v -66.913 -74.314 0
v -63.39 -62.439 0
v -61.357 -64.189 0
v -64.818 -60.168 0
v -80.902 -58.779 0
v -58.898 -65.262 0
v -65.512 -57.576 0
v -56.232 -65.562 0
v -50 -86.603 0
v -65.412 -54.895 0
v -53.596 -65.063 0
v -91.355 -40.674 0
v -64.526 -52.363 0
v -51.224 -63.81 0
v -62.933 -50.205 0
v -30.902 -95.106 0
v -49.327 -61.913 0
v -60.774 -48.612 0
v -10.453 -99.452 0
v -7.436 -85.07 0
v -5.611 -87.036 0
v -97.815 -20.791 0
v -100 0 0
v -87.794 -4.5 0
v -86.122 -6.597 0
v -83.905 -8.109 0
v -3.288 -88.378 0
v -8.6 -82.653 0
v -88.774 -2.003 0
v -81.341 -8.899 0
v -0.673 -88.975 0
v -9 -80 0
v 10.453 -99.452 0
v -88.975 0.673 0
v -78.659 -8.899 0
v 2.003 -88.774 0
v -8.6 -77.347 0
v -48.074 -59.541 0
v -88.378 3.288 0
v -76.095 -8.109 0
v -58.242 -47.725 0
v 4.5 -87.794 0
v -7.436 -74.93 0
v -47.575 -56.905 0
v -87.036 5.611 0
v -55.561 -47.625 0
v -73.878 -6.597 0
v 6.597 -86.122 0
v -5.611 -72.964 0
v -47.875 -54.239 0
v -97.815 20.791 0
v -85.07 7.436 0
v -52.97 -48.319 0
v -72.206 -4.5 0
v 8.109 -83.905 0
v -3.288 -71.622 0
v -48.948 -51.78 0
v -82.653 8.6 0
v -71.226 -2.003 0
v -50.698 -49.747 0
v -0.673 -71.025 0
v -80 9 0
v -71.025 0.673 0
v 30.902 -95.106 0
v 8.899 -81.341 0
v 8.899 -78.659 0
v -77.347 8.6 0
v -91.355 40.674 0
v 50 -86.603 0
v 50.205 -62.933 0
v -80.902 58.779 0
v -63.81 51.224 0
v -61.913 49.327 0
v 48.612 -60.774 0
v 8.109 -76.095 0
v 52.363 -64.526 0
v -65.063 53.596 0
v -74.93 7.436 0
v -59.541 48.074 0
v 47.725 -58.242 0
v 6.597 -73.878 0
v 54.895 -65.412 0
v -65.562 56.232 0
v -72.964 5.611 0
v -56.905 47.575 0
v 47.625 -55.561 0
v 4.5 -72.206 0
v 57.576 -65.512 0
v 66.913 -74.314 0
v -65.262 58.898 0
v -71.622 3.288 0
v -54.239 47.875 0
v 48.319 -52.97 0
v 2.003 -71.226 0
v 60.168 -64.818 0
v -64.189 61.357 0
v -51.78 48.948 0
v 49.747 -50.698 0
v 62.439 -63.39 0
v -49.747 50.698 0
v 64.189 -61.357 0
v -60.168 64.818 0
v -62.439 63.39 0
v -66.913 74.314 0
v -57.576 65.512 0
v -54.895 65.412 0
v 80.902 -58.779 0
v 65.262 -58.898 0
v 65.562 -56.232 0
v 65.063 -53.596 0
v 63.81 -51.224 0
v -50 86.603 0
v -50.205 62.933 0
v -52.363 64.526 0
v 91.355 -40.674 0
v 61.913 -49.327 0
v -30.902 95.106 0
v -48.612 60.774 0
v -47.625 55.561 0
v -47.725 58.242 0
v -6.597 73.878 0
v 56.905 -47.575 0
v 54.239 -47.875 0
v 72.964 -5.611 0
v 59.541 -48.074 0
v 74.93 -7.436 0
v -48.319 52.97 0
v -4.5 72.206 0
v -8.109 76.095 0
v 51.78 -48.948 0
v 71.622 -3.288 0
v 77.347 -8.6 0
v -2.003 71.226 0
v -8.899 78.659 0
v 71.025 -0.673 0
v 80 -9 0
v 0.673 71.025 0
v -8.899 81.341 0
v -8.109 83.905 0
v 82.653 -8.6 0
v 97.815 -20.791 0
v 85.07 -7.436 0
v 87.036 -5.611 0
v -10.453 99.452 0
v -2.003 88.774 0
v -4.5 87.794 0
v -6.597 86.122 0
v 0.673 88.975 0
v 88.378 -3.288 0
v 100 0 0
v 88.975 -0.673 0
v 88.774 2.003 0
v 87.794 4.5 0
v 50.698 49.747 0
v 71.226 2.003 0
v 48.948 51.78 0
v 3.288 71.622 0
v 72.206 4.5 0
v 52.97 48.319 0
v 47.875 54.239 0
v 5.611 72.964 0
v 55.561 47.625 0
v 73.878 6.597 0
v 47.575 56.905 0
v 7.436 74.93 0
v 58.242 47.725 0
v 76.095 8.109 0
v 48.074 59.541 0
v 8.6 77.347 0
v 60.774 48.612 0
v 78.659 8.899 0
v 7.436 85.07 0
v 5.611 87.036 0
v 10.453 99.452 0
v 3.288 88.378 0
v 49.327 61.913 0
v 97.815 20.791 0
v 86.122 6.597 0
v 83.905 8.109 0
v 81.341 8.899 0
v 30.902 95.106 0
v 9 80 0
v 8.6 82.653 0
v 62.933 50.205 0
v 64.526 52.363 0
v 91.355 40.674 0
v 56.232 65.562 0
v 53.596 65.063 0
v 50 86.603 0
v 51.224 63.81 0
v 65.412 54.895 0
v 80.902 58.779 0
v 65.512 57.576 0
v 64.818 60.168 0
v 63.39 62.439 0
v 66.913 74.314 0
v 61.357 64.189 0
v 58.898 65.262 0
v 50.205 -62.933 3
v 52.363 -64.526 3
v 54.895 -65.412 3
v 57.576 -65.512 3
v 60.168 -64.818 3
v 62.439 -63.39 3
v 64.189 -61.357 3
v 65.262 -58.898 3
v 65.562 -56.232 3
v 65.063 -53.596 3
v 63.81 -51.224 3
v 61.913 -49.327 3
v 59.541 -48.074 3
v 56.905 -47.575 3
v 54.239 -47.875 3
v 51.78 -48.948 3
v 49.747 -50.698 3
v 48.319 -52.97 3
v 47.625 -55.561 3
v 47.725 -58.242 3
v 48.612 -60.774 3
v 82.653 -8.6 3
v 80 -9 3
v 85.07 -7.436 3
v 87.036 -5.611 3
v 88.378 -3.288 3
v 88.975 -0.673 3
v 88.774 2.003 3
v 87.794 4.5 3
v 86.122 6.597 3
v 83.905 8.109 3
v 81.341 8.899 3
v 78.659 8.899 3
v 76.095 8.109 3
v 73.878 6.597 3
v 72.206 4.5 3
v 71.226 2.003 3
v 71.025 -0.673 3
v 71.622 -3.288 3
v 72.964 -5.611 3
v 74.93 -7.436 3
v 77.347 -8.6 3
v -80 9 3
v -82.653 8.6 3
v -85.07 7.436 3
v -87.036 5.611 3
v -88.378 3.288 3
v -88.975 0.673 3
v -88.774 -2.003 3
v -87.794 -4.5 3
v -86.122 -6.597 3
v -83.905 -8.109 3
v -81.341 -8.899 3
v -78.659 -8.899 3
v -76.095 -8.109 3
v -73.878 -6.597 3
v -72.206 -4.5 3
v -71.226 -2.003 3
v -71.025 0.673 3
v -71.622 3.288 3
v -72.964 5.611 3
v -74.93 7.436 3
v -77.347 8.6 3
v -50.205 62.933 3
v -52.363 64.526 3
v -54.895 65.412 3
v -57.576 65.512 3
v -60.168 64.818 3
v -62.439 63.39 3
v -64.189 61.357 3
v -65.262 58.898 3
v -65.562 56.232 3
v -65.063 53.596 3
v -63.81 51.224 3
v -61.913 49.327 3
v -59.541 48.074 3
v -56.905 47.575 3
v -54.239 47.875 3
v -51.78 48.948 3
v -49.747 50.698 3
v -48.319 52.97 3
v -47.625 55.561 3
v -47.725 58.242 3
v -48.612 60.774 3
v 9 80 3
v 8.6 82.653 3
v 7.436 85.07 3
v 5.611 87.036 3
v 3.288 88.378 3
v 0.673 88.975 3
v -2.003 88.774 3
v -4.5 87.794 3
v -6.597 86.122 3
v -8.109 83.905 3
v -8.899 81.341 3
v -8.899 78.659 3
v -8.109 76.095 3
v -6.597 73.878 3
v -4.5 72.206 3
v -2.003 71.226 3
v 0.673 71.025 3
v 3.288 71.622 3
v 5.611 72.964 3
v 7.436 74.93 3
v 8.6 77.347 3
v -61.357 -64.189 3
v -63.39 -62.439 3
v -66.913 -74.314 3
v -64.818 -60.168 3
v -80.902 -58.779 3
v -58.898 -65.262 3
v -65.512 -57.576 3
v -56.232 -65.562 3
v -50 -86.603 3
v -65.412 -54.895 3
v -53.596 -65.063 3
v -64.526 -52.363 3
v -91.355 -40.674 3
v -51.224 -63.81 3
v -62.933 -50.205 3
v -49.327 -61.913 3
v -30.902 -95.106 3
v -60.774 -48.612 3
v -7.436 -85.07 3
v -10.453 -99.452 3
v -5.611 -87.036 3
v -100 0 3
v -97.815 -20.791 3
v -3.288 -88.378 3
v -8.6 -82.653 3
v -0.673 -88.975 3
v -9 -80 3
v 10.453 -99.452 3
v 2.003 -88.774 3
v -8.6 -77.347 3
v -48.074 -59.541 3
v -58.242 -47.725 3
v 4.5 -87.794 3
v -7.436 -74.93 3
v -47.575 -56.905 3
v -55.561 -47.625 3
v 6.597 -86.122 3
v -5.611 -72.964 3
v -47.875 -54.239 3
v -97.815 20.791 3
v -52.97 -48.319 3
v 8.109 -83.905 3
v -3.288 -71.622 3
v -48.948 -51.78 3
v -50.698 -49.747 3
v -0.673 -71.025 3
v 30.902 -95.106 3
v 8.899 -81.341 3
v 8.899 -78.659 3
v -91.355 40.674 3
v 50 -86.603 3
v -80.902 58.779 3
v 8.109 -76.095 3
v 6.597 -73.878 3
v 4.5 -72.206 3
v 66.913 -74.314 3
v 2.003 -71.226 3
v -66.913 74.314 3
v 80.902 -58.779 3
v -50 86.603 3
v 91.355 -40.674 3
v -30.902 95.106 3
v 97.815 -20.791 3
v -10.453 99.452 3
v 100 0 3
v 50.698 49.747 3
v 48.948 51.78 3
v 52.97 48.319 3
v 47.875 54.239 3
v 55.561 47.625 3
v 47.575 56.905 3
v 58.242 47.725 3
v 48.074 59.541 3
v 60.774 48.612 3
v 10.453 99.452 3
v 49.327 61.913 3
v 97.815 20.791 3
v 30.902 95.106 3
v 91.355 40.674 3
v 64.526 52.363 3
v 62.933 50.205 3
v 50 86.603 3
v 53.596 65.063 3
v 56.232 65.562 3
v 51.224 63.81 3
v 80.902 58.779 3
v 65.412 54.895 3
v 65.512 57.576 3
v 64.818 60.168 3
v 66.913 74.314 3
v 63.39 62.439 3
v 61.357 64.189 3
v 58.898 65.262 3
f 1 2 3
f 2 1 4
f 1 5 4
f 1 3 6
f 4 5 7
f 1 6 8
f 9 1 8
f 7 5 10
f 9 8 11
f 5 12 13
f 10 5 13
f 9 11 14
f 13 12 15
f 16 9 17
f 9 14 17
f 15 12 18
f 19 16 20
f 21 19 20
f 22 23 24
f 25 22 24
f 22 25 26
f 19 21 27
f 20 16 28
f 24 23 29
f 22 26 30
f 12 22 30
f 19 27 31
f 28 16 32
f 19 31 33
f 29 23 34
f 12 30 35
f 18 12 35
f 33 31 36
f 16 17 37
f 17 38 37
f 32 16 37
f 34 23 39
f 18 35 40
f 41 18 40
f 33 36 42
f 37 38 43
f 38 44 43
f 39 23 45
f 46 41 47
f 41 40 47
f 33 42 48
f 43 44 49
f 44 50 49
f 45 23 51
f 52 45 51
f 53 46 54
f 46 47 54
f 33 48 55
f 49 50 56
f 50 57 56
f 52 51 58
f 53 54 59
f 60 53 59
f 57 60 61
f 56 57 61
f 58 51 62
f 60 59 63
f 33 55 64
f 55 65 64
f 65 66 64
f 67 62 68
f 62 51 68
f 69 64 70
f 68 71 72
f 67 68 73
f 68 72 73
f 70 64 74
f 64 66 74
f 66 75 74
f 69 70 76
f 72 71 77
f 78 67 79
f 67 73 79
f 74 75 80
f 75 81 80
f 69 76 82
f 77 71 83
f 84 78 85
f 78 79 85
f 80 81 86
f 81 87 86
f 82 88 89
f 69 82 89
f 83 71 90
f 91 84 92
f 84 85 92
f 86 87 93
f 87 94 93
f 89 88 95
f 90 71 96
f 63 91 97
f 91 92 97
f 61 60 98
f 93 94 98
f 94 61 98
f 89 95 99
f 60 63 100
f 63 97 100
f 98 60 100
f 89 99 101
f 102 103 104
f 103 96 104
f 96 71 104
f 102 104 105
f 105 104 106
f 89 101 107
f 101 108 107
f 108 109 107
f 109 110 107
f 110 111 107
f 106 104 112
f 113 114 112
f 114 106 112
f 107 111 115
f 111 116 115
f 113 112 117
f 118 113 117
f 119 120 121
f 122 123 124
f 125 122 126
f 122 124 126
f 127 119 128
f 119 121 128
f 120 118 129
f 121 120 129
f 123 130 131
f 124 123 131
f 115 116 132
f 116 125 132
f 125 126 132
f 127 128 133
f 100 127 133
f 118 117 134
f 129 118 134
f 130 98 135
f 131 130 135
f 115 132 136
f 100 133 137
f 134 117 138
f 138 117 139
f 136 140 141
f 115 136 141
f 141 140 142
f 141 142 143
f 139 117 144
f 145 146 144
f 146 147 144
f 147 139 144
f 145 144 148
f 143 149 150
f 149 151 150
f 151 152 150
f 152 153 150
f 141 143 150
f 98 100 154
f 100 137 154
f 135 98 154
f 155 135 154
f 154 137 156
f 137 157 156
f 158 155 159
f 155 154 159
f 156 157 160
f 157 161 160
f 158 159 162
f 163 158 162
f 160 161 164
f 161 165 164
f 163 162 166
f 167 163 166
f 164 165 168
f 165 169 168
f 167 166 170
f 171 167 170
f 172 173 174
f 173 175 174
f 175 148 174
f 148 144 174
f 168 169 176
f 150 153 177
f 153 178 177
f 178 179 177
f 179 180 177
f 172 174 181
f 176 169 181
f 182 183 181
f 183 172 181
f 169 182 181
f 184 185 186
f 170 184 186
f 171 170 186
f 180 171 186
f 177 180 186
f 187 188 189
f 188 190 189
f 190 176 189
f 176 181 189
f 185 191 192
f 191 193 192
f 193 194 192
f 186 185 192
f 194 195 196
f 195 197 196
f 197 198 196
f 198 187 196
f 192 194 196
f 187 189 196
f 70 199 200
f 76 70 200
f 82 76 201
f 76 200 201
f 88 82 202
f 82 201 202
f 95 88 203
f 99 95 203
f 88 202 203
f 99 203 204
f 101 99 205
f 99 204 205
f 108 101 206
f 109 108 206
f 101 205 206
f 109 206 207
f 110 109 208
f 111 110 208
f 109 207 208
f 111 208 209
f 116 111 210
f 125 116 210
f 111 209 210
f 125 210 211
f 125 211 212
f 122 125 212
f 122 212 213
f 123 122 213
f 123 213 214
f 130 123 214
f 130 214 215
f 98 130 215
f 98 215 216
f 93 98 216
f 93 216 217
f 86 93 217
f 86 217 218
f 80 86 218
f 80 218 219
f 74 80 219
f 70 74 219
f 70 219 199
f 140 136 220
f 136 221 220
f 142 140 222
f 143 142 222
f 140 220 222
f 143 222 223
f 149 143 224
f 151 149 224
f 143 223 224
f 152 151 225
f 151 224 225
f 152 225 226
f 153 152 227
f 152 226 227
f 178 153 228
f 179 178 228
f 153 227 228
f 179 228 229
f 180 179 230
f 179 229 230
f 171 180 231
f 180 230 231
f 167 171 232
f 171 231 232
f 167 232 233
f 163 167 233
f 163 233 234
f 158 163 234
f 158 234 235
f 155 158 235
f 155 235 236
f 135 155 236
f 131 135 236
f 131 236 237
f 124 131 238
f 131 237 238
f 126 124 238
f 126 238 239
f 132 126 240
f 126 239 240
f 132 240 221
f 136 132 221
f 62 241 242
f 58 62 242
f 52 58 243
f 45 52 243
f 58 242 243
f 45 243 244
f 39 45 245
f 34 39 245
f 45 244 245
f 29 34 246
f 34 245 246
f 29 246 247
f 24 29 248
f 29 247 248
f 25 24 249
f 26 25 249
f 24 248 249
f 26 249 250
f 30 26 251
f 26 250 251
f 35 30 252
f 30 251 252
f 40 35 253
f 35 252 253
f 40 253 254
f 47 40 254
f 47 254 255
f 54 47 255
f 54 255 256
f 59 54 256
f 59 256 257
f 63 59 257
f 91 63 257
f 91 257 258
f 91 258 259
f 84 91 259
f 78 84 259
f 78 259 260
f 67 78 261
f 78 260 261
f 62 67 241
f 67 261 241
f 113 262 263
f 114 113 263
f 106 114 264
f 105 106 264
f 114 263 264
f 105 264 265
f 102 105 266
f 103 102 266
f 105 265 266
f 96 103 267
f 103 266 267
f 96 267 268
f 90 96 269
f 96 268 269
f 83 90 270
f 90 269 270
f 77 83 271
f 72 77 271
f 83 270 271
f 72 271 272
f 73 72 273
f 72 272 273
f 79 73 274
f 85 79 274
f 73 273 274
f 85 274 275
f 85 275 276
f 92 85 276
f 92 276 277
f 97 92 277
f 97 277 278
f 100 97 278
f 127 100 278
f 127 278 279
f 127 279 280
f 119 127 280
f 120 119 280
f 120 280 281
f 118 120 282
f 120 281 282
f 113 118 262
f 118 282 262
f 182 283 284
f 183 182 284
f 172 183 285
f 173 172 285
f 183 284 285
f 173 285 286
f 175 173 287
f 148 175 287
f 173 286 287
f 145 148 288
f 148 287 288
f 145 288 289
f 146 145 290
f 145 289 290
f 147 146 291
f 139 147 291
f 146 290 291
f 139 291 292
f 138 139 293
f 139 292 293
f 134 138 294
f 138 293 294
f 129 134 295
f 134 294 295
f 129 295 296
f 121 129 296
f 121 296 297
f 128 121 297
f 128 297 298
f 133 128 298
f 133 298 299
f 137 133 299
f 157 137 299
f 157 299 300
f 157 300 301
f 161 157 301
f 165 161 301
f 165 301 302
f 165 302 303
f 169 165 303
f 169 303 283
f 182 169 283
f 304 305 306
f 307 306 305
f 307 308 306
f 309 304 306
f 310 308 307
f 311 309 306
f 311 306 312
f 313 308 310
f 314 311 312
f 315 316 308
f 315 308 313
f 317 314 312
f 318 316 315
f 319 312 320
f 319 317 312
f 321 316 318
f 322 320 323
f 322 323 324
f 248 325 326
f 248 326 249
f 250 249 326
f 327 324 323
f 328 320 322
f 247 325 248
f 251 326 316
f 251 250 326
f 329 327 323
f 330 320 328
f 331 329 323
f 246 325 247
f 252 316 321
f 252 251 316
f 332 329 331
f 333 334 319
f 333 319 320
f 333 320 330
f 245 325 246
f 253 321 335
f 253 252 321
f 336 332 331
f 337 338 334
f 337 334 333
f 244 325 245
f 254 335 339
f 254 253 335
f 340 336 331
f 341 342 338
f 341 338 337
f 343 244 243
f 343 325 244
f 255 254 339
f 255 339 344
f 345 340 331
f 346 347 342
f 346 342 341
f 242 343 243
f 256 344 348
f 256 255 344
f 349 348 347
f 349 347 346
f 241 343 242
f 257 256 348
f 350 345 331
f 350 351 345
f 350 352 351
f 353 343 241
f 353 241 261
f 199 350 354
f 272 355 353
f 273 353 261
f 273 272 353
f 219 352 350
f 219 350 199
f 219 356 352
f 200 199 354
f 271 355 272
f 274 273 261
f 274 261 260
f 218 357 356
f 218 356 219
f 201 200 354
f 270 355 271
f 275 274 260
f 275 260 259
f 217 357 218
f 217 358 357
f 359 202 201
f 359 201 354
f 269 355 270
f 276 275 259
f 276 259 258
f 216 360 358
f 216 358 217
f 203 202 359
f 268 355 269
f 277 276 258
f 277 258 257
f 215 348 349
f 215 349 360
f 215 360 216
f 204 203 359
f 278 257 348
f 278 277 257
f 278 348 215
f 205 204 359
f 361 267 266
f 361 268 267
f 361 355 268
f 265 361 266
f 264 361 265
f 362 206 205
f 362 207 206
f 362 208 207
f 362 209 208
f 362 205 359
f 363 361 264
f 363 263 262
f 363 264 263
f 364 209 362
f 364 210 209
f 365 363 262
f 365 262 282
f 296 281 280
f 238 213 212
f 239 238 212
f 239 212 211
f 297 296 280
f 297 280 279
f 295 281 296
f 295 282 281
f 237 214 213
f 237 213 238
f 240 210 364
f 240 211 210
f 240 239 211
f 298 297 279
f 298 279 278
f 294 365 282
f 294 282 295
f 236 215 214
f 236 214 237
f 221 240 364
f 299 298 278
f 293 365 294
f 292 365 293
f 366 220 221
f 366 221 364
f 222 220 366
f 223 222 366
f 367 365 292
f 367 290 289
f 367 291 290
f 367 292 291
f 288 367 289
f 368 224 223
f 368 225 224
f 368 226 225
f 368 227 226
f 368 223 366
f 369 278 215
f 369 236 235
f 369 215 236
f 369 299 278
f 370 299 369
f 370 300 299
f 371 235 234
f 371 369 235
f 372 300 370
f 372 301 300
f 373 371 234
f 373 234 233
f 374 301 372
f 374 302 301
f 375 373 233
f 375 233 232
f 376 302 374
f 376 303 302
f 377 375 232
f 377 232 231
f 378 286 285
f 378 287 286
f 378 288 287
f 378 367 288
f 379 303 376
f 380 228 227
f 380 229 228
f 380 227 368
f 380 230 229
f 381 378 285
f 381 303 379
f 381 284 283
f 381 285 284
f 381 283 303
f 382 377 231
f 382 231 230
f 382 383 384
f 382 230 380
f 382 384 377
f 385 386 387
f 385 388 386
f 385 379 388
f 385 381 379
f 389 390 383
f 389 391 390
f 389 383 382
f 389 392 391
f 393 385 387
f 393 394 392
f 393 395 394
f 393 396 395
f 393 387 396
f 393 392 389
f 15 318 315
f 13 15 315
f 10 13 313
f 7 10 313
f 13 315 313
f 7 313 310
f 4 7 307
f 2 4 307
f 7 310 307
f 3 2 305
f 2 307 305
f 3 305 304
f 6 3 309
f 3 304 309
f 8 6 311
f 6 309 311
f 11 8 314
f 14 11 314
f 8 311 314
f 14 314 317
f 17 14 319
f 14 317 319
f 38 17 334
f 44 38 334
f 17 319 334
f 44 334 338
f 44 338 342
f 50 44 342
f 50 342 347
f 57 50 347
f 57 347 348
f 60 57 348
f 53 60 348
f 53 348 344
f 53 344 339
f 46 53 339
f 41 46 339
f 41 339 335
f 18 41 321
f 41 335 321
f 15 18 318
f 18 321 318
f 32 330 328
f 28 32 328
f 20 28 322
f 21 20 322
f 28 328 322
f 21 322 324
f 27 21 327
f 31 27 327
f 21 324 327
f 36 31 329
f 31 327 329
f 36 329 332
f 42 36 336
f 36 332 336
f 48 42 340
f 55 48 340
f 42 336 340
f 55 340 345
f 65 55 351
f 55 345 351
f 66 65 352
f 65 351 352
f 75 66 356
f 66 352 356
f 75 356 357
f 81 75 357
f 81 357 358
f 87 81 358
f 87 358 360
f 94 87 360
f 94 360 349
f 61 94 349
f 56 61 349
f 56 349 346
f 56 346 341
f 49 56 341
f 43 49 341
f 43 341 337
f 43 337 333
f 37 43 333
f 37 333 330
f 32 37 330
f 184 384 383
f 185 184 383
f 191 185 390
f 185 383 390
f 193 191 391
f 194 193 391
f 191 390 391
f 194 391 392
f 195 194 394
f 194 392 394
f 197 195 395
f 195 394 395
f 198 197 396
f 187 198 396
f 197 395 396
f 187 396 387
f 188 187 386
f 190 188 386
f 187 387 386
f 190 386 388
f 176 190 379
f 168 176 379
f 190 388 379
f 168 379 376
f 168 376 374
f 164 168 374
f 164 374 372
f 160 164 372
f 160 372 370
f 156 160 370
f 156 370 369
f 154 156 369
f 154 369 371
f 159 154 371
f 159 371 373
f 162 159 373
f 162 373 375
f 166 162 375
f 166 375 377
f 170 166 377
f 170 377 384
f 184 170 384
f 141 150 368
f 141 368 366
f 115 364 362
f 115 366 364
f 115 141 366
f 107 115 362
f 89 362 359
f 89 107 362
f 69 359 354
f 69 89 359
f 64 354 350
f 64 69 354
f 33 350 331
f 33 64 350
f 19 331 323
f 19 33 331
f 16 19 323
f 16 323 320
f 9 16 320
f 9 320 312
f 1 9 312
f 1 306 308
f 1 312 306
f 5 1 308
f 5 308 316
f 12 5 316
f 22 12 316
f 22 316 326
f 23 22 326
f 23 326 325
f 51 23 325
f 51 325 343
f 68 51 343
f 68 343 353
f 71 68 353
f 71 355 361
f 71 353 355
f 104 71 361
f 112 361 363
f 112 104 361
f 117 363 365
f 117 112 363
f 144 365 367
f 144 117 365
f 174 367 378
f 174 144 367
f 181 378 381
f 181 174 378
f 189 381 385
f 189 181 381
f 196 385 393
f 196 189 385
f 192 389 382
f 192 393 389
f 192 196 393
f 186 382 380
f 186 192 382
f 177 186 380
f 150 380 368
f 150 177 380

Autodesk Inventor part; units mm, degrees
ref_plane "YZ Plane" through (0, 0, 0) normal (1, 0, 0) x (0, 1, 0)
ref_plane "XZ Plane" through (0, 0, 0) normal (0, 1, 0) x (-1, 0, 0)
ref_plane "XY Plane" through (0, 0, 0) normal (0, 0, 1) x (1, 0, 0)
sketch "Sketch1" plane through (0, 0, 0) normal (0, 0, 1) x (1, 0, 0)
  circle A0 centre (0, 0) radius 100
  dimension "d22" = 200
extrude "Plate1" add sketch "Sketch1" along normal blind 3
sketch "Sketch5" plane through (0, 0, 3) normal (0, 0, 1) x (1, 0, 0)
  circle A0 centre (0, 0) radius 100 projected
  circle A1 centre (0, 80) radius 9
  dimension "d23" = 18
  dimension "d24" = 80
extrude "Cut1" cut sketch "Sketch5" against normal blind 3 contours A1
pattern_circular "Circular Pattern1" count 8 over 360 about axis through (0, 0, 0) along (0, 0, 1) of "Cut1"
equation "\"d25\" = Thickness"
equation "\"d2\" = Thickness"
equation "\"BendReliefWidth\" = Thickness"
equation "\"BendReliefDepth\" = 0.5 * Thickness"
equation "\"CornerReliefSize\" = 4 * Thickness"
equation "\"MinimumRemnant\" = 2 * Thickness"
equation "\"TransitionRadius\" = BendRadius"
equation "\"JacobiRadiusSize\" = BendRadius"
equation "\"GapSize\" = Thickness"
equation "\"Thickness\" = 3"
equation "\"BendRadius\" = 5"
properties part number "MSC 920 plug 88.9" material "Stainless Steel"
